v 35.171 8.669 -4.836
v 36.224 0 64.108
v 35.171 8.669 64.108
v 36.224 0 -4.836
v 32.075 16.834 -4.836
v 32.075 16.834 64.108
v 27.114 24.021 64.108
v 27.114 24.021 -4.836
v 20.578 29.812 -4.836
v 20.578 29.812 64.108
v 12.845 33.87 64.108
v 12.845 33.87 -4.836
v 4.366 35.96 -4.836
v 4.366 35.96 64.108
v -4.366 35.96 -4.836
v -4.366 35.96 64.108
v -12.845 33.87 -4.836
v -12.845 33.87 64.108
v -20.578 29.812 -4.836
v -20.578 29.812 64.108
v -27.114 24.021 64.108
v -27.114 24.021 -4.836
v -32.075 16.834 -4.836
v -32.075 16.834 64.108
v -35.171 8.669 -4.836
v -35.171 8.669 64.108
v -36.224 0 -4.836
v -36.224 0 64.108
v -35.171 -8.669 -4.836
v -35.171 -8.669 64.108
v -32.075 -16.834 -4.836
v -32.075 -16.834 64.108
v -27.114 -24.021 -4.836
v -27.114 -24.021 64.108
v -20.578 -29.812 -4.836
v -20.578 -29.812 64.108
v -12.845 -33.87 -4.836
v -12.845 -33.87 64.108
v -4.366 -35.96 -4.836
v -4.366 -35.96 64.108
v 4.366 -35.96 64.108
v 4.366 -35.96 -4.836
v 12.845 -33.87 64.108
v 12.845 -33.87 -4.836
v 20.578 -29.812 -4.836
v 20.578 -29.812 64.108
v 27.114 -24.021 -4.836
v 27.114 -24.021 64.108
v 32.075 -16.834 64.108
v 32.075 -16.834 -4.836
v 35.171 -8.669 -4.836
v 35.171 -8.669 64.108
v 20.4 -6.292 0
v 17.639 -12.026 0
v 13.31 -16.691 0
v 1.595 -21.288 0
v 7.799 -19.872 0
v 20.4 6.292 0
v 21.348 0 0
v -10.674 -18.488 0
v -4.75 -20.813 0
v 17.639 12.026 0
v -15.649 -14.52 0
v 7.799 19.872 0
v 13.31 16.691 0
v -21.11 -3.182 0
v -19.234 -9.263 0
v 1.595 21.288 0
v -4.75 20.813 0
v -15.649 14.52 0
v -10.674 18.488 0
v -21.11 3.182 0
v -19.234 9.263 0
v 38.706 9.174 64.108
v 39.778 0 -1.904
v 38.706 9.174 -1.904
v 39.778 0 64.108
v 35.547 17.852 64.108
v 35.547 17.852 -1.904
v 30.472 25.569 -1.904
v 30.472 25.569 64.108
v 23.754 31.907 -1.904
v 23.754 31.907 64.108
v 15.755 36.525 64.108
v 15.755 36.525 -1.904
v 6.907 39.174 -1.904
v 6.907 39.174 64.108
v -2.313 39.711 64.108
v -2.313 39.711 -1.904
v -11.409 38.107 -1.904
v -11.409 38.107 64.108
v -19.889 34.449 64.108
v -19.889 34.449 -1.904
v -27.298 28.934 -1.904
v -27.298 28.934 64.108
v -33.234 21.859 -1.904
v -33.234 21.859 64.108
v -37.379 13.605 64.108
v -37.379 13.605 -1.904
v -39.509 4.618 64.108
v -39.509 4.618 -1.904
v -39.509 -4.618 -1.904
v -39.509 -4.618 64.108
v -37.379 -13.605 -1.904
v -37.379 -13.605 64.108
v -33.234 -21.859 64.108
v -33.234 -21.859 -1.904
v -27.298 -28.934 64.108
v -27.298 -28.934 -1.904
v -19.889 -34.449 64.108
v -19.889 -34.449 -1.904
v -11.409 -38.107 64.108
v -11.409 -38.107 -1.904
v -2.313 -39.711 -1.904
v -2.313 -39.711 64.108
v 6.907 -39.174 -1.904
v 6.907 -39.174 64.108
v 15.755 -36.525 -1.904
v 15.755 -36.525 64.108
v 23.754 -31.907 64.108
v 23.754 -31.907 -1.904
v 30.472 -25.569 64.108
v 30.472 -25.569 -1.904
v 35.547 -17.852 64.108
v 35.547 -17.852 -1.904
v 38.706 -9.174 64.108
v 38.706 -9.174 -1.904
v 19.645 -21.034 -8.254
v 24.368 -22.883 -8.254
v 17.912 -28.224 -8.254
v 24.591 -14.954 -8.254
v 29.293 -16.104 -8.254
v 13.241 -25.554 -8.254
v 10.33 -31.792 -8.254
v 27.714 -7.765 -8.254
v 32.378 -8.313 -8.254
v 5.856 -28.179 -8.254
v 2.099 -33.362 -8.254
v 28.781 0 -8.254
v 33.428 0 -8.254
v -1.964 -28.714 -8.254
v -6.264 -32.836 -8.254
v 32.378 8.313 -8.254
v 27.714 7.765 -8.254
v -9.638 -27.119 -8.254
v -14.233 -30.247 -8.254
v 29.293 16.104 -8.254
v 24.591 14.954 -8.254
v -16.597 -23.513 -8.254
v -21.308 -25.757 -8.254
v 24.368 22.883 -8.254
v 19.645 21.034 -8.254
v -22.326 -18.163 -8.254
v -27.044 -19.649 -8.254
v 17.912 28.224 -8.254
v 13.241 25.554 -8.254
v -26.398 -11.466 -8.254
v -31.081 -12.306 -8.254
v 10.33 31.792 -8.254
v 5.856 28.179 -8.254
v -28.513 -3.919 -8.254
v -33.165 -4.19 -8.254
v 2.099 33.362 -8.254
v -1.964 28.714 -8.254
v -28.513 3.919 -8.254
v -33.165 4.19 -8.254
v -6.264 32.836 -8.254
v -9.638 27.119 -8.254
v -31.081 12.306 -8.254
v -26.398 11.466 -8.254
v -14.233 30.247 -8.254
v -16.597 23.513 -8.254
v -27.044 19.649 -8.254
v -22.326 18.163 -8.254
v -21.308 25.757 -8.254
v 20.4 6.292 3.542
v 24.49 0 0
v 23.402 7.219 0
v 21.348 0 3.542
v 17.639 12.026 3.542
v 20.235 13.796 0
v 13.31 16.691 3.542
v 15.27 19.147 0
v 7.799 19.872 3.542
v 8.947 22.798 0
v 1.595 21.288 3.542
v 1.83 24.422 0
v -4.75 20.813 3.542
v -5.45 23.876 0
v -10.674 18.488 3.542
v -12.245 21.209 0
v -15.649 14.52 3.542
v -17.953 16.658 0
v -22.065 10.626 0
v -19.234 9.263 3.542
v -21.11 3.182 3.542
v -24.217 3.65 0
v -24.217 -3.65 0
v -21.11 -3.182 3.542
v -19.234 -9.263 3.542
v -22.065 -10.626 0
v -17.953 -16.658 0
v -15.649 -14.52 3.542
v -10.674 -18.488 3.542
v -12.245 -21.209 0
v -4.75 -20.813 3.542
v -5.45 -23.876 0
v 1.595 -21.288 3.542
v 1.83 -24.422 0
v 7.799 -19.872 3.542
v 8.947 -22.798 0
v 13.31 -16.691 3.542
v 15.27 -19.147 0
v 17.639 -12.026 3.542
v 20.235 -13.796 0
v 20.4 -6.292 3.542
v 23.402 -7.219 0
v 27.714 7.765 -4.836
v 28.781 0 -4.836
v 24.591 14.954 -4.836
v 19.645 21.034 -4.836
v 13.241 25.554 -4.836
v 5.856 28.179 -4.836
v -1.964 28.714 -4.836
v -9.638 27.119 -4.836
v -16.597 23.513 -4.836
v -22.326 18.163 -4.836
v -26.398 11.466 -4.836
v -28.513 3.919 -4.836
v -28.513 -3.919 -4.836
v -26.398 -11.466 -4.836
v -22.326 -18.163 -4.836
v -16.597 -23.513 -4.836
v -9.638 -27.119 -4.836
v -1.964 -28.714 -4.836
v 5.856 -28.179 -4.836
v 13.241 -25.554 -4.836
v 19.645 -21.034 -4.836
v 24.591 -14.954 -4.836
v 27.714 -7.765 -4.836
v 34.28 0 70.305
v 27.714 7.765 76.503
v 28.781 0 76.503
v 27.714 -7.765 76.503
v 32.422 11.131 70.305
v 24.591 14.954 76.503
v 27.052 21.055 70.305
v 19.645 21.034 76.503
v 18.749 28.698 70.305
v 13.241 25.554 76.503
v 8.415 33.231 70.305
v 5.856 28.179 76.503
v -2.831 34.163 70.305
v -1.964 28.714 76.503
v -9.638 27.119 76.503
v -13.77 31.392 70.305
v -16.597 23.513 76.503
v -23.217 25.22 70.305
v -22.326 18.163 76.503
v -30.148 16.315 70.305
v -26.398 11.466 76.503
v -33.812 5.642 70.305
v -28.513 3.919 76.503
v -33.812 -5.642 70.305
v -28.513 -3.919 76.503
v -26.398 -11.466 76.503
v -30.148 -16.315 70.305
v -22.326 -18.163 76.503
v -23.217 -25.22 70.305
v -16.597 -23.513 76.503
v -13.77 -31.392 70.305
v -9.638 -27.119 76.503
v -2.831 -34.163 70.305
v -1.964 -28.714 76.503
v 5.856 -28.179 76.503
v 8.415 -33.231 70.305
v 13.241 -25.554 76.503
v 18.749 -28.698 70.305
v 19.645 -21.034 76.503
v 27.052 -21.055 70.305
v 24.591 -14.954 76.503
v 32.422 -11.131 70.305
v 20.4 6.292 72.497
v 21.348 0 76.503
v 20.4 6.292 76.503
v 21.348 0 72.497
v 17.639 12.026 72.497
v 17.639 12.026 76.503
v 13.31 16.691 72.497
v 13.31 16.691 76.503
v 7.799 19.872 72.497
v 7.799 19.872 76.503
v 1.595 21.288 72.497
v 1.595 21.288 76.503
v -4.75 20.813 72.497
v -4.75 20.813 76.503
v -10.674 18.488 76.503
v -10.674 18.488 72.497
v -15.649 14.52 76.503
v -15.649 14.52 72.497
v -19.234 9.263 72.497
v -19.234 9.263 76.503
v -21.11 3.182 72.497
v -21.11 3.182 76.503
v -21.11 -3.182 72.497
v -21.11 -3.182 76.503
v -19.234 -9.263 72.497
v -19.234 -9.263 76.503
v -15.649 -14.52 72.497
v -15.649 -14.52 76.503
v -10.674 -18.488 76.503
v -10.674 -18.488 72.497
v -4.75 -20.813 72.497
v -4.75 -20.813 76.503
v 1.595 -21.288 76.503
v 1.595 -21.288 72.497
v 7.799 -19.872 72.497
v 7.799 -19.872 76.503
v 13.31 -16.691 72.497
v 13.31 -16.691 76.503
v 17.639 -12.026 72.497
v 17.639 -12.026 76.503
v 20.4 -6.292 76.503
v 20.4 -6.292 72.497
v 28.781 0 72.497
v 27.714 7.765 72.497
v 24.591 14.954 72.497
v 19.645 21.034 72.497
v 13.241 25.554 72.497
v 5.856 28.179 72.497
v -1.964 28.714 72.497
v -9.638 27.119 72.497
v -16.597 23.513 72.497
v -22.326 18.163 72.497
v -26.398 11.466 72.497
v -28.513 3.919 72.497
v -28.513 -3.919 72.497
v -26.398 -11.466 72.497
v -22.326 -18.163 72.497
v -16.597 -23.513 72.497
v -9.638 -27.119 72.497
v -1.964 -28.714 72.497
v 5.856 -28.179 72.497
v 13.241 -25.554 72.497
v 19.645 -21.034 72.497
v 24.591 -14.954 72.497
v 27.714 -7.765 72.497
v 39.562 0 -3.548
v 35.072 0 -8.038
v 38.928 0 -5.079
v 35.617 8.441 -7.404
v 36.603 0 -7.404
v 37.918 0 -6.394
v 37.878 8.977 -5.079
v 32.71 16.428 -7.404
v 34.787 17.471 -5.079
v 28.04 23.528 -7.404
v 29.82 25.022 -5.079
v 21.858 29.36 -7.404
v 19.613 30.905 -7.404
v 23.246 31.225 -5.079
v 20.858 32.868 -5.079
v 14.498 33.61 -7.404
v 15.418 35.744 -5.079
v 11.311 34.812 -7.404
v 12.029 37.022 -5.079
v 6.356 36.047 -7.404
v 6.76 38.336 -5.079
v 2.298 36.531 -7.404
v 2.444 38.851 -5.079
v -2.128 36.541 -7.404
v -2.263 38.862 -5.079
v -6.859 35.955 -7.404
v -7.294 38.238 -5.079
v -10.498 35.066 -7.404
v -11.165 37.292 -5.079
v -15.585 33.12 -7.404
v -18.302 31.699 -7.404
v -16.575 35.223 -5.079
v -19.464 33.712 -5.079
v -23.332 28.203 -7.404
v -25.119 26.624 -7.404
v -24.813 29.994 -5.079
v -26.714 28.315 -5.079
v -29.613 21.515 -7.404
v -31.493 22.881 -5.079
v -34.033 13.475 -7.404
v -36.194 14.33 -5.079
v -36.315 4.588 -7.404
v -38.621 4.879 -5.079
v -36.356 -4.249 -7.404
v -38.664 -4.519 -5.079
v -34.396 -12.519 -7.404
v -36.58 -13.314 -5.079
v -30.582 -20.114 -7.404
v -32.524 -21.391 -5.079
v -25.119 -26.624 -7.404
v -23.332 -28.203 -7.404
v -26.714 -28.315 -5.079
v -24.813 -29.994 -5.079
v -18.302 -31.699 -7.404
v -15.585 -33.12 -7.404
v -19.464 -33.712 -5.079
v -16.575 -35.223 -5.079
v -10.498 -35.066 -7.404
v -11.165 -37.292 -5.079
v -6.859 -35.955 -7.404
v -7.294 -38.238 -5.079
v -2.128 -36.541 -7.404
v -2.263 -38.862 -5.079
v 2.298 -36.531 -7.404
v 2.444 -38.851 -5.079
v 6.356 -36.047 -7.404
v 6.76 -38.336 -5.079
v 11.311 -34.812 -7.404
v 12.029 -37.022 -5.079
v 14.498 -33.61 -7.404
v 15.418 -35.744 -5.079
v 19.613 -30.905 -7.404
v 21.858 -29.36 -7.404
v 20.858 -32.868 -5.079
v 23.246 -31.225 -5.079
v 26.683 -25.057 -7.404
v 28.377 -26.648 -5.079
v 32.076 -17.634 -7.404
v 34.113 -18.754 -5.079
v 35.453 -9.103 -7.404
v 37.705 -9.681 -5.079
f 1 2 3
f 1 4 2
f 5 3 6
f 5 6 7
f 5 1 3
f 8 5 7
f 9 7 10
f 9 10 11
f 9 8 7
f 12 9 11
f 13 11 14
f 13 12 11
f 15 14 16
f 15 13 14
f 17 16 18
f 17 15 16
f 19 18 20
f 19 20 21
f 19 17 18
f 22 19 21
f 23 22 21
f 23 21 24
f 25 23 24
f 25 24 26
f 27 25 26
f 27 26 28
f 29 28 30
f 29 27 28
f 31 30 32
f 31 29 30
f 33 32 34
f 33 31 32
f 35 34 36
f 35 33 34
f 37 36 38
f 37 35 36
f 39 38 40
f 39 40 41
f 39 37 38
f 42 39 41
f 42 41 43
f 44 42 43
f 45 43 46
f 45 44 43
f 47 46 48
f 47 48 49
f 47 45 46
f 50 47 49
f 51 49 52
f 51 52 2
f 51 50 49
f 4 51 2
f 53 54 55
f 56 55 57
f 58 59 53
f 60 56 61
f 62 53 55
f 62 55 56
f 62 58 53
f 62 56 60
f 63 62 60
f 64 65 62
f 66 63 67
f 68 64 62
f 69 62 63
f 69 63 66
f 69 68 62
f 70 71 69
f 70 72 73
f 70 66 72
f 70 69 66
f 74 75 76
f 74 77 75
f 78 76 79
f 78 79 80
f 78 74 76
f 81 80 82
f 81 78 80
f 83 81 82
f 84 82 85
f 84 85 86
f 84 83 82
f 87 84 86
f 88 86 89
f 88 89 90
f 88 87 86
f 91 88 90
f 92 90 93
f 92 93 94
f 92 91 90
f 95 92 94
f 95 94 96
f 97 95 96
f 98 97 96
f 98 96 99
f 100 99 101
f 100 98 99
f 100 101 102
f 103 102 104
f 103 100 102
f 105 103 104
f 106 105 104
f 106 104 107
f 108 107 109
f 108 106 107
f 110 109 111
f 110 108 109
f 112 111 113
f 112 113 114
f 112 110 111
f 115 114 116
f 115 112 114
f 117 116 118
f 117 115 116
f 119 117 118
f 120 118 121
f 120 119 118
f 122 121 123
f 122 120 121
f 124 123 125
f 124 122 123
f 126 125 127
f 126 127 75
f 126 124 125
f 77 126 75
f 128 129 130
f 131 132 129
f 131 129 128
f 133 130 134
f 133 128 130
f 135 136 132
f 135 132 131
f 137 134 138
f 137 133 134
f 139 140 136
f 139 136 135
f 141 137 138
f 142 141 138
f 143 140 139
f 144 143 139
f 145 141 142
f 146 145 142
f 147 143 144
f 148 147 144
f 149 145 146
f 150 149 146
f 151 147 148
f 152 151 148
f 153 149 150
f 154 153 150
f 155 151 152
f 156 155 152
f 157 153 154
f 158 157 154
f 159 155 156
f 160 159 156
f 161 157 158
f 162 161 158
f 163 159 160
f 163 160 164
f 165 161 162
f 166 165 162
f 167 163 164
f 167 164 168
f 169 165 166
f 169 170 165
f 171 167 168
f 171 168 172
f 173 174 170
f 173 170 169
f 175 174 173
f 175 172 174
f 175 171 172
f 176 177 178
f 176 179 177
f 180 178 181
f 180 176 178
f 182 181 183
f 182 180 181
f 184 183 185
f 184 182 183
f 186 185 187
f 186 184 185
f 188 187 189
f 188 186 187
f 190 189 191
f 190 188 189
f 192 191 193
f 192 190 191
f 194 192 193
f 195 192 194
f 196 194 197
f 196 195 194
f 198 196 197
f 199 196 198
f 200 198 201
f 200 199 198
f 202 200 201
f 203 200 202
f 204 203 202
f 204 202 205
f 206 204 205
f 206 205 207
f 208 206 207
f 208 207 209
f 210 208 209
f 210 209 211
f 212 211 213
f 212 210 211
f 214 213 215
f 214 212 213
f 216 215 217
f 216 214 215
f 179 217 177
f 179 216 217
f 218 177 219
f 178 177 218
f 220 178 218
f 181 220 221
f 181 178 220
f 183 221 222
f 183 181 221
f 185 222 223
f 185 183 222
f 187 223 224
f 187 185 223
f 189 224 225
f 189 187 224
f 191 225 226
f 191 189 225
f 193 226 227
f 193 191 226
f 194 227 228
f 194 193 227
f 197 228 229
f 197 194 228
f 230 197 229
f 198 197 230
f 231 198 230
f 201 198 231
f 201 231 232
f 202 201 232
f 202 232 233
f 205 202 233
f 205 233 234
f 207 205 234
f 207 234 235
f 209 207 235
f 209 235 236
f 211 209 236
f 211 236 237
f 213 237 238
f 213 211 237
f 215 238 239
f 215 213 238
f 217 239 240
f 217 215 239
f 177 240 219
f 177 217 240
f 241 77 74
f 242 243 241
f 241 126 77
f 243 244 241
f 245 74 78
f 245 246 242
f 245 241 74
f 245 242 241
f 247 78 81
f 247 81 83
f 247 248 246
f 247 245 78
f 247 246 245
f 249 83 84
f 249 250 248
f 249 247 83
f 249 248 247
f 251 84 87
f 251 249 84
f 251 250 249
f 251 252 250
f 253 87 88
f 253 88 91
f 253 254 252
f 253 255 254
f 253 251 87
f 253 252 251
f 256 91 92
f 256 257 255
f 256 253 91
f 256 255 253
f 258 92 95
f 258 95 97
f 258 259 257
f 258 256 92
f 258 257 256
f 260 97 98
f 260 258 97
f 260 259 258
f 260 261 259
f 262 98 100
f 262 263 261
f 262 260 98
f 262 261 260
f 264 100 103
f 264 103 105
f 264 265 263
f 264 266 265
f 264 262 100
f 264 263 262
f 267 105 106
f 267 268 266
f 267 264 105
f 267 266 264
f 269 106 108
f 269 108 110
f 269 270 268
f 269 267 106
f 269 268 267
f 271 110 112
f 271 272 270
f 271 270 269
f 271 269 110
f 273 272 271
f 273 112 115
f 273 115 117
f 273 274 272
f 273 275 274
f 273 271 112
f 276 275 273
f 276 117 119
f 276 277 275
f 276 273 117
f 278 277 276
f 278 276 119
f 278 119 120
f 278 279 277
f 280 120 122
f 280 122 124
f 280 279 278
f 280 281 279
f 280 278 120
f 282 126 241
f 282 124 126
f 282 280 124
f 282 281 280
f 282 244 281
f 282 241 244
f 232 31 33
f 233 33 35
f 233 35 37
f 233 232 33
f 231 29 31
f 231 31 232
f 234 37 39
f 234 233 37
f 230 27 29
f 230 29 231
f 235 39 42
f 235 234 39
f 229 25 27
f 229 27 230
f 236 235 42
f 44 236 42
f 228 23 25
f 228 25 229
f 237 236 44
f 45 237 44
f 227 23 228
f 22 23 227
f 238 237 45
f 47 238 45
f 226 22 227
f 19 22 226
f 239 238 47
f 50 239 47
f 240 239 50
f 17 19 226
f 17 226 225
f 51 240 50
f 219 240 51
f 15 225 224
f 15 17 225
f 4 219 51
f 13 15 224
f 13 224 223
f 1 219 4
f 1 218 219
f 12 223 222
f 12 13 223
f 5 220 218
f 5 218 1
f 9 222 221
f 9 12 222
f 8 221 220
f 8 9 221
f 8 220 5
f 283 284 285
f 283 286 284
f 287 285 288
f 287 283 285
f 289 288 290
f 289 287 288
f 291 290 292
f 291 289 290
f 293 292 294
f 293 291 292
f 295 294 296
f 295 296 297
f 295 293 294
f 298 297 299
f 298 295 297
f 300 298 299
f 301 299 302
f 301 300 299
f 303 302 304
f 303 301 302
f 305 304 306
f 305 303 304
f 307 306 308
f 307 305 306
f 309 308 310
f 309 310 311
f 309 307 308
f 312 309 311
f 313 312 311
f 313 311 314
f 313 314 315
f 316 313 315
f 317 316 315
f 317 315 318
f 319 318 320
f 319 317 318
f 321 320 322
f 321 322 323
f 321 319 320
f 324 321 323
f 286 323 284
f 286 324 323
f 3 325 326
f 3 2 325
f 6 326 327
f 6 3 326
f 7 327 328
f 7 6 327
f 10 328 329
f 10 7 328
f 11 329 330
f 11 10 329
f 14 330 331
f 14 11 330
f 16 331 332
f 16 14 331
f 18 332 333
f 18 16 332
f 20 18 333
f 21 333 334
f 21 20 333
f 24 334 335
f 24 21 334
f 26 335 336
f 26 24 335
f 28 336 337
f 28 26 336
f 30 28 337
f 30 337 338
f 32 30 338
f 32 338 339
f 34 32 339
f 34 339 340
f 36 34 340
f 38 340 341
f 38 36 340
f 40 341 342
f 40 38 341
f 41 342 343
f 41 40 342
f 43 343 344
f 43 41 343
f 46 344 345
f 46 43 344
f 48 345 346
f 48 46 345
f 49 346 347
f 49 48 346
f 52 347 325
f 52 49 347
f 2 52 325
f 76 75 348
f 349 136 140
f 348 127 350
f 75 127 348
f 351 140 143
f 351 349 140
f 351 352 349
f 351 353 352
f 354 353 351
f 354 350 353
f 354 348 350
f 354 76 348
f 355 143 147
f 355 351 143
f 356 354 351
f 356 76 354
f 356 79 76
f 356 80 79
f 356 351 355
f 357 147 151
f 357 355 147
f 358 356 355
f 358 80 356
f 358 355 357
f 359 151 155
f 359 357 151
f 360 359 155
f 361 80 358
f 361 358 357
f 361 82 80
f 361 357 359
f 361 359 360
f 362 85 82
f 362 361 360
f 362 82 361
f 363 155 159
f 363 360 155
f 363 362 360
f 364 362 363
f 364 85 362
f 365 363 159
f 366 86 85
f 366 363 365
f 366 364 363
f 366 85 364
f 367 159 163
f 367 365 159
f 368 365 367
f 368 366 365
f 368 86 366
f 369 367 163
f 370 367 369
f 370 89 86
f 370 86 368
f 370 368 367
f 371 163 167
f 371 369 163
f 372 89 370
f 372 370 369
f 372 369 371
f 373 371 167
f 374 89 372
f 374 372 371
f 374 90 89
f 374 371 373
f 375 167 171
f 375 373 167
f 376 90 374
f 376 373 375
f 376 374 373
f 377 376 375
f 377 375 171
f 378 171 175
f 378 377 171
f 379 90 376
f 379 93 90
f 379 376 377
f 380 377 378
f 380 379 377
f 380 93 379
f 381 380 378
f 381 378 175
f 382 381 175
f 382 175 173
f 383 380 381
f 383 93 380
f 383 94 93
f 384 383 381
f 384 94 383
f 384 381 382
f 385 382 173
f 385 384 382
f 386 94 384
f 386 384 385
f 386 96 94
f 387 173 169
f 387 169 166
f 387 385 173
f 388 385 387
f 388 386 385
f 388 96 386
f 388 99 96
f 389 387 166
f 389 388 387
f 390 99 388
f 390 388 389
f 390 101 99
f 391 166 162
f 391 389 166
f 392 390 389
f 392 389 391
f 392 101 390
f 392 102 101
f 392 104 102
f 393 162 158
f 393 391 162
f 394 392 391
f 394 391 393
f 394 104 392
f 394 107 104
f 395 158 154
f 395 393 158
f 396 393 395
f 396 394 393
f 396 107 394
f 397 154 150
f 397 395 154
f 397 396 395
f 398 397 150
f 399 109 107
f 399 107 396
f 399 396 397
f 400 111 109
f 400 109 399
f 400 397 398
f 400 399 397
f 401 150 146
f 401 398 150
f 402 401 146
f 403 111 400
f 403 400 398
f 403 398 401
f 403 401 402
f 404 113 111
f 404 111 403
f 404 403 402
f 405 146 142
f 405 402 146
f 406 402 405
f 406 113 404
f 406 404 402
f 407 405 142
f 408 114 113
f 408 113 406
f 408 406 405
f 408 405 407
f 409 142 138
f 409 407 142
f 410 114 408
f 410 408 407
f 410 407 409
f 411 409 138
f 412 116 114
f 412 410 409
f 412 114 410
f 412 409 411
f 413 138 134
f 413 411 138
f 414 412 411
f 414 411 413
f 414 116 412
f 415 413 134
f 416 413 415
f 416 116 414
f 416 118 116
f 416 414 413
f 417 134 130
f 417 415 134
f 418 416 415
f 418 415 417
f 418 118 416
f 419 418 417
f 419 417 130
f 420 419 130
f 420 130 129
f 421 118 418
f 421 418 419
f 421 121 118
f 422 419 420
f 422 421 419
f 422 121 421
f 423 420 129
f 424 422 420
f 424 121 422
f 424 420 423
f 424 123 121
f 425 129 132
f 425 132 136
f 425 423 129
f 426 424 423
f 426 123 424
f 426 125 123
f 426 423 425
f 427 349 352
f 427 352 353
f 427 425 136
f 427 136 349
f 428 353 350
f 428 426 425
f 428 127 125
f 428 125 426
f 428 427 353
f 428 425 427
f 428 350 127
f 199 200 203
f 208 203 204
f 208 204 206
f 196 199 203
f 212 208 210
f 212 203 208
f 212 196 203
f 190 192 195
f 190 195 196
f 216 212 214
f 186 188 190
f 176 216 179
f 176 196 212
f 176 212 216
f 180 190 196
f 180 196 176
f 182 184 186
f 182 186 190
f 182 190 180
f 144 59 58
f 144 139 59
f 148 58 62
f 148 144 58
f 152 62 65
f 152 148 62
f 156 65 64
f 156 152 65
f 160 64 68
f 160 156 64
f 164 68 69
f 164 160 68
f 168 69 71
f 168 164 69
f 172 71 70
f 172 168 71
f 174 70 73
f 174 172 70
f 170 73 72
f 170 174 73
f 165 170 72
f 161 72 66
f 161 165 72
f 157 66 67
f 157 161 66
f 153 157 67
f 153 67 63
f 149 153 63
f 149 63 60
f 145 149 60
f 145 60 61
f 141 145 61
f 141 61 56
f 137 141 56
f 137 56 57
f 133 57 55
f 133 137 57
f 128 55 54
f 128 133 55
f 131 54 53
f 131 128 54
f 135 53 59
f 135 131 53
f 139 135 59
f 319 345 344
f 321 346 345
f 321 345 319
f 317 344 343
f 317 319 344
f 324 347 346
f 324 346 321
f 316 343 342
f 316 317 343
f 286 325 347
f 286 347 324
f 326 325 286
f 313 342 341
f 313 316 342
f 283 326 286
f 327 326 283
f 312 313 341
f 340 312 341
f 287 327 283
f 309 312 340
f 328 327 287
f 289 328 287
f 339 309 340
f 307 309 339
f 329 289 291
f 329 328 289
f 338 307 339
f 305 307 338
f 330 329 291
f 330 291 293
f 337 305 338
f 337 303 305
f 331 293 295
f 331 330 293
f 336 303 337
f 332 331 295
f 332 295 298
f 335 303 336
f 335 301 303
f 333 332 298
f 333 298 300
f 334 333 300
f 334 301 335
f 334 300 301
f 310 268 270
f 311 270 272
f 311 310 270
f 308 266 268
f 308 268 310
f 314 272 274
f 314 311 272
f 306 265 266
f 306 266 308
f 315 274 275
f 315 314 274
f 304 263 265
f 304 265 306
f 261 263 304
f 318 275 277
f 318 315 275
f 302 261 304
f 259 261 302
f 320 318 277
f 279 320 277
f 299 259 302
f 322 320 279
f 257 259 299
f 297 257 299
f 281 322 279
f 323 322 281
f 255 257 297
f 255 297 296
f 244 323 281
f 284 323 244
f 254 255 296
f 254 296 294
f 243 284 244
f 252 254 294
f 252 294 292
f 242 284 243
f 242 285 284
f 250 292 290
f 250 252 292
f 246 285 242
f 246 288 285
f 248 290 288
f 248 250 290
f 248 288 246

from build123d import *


with BuildPart() as f1:
    # F0 (on Front) → F1 (revolve)
    with BuildSketch(Plane.XZ):
        with BuildLine():
            Line((0, 3.541697), (0, 0))
            Line((0, 0), (21.348186, 0))
            Line((21.348186, 0), (28.781075, -8.254268))
            Line((28.781075, -8.254268), (33.428356, -8.254268))
            ThreePointArc((33.428356, -8.254268), (37.918484, -6.394396), (39.778356, -1.904268))
            Line((39.778356, -1.904268), (39.778356, 64.10753))
            Line((39.778356, 64.10753), (28.781075, 76.502554))
            Line((28.781075, 76.502554), (21.348186, 76.502554))
            Line((21.348186, 76.502554), (21.348186, 72.496518))
            Line((21.348186, 72.496518), (28.781075, 72.496518))
            Line((28.781075, 72.496518), (36.224067, 64.10753))
            Line((36.224067, 64.10753), (36.224067, -4.835905))
            Line((36.224067, -4.835905), (28.781075, -4.835905))
            Line((28.781075, -4.835905), (24.490498, 0))
            Line((24.490498, 0), (21.348186, 3.541697))
            Line((21.348186, 3.541697), (0, 3.541697))
        make_face()
    revolve(axis=Axis((0, 0, 34.186214), (0, 0, 1)))


solid = f1.part
